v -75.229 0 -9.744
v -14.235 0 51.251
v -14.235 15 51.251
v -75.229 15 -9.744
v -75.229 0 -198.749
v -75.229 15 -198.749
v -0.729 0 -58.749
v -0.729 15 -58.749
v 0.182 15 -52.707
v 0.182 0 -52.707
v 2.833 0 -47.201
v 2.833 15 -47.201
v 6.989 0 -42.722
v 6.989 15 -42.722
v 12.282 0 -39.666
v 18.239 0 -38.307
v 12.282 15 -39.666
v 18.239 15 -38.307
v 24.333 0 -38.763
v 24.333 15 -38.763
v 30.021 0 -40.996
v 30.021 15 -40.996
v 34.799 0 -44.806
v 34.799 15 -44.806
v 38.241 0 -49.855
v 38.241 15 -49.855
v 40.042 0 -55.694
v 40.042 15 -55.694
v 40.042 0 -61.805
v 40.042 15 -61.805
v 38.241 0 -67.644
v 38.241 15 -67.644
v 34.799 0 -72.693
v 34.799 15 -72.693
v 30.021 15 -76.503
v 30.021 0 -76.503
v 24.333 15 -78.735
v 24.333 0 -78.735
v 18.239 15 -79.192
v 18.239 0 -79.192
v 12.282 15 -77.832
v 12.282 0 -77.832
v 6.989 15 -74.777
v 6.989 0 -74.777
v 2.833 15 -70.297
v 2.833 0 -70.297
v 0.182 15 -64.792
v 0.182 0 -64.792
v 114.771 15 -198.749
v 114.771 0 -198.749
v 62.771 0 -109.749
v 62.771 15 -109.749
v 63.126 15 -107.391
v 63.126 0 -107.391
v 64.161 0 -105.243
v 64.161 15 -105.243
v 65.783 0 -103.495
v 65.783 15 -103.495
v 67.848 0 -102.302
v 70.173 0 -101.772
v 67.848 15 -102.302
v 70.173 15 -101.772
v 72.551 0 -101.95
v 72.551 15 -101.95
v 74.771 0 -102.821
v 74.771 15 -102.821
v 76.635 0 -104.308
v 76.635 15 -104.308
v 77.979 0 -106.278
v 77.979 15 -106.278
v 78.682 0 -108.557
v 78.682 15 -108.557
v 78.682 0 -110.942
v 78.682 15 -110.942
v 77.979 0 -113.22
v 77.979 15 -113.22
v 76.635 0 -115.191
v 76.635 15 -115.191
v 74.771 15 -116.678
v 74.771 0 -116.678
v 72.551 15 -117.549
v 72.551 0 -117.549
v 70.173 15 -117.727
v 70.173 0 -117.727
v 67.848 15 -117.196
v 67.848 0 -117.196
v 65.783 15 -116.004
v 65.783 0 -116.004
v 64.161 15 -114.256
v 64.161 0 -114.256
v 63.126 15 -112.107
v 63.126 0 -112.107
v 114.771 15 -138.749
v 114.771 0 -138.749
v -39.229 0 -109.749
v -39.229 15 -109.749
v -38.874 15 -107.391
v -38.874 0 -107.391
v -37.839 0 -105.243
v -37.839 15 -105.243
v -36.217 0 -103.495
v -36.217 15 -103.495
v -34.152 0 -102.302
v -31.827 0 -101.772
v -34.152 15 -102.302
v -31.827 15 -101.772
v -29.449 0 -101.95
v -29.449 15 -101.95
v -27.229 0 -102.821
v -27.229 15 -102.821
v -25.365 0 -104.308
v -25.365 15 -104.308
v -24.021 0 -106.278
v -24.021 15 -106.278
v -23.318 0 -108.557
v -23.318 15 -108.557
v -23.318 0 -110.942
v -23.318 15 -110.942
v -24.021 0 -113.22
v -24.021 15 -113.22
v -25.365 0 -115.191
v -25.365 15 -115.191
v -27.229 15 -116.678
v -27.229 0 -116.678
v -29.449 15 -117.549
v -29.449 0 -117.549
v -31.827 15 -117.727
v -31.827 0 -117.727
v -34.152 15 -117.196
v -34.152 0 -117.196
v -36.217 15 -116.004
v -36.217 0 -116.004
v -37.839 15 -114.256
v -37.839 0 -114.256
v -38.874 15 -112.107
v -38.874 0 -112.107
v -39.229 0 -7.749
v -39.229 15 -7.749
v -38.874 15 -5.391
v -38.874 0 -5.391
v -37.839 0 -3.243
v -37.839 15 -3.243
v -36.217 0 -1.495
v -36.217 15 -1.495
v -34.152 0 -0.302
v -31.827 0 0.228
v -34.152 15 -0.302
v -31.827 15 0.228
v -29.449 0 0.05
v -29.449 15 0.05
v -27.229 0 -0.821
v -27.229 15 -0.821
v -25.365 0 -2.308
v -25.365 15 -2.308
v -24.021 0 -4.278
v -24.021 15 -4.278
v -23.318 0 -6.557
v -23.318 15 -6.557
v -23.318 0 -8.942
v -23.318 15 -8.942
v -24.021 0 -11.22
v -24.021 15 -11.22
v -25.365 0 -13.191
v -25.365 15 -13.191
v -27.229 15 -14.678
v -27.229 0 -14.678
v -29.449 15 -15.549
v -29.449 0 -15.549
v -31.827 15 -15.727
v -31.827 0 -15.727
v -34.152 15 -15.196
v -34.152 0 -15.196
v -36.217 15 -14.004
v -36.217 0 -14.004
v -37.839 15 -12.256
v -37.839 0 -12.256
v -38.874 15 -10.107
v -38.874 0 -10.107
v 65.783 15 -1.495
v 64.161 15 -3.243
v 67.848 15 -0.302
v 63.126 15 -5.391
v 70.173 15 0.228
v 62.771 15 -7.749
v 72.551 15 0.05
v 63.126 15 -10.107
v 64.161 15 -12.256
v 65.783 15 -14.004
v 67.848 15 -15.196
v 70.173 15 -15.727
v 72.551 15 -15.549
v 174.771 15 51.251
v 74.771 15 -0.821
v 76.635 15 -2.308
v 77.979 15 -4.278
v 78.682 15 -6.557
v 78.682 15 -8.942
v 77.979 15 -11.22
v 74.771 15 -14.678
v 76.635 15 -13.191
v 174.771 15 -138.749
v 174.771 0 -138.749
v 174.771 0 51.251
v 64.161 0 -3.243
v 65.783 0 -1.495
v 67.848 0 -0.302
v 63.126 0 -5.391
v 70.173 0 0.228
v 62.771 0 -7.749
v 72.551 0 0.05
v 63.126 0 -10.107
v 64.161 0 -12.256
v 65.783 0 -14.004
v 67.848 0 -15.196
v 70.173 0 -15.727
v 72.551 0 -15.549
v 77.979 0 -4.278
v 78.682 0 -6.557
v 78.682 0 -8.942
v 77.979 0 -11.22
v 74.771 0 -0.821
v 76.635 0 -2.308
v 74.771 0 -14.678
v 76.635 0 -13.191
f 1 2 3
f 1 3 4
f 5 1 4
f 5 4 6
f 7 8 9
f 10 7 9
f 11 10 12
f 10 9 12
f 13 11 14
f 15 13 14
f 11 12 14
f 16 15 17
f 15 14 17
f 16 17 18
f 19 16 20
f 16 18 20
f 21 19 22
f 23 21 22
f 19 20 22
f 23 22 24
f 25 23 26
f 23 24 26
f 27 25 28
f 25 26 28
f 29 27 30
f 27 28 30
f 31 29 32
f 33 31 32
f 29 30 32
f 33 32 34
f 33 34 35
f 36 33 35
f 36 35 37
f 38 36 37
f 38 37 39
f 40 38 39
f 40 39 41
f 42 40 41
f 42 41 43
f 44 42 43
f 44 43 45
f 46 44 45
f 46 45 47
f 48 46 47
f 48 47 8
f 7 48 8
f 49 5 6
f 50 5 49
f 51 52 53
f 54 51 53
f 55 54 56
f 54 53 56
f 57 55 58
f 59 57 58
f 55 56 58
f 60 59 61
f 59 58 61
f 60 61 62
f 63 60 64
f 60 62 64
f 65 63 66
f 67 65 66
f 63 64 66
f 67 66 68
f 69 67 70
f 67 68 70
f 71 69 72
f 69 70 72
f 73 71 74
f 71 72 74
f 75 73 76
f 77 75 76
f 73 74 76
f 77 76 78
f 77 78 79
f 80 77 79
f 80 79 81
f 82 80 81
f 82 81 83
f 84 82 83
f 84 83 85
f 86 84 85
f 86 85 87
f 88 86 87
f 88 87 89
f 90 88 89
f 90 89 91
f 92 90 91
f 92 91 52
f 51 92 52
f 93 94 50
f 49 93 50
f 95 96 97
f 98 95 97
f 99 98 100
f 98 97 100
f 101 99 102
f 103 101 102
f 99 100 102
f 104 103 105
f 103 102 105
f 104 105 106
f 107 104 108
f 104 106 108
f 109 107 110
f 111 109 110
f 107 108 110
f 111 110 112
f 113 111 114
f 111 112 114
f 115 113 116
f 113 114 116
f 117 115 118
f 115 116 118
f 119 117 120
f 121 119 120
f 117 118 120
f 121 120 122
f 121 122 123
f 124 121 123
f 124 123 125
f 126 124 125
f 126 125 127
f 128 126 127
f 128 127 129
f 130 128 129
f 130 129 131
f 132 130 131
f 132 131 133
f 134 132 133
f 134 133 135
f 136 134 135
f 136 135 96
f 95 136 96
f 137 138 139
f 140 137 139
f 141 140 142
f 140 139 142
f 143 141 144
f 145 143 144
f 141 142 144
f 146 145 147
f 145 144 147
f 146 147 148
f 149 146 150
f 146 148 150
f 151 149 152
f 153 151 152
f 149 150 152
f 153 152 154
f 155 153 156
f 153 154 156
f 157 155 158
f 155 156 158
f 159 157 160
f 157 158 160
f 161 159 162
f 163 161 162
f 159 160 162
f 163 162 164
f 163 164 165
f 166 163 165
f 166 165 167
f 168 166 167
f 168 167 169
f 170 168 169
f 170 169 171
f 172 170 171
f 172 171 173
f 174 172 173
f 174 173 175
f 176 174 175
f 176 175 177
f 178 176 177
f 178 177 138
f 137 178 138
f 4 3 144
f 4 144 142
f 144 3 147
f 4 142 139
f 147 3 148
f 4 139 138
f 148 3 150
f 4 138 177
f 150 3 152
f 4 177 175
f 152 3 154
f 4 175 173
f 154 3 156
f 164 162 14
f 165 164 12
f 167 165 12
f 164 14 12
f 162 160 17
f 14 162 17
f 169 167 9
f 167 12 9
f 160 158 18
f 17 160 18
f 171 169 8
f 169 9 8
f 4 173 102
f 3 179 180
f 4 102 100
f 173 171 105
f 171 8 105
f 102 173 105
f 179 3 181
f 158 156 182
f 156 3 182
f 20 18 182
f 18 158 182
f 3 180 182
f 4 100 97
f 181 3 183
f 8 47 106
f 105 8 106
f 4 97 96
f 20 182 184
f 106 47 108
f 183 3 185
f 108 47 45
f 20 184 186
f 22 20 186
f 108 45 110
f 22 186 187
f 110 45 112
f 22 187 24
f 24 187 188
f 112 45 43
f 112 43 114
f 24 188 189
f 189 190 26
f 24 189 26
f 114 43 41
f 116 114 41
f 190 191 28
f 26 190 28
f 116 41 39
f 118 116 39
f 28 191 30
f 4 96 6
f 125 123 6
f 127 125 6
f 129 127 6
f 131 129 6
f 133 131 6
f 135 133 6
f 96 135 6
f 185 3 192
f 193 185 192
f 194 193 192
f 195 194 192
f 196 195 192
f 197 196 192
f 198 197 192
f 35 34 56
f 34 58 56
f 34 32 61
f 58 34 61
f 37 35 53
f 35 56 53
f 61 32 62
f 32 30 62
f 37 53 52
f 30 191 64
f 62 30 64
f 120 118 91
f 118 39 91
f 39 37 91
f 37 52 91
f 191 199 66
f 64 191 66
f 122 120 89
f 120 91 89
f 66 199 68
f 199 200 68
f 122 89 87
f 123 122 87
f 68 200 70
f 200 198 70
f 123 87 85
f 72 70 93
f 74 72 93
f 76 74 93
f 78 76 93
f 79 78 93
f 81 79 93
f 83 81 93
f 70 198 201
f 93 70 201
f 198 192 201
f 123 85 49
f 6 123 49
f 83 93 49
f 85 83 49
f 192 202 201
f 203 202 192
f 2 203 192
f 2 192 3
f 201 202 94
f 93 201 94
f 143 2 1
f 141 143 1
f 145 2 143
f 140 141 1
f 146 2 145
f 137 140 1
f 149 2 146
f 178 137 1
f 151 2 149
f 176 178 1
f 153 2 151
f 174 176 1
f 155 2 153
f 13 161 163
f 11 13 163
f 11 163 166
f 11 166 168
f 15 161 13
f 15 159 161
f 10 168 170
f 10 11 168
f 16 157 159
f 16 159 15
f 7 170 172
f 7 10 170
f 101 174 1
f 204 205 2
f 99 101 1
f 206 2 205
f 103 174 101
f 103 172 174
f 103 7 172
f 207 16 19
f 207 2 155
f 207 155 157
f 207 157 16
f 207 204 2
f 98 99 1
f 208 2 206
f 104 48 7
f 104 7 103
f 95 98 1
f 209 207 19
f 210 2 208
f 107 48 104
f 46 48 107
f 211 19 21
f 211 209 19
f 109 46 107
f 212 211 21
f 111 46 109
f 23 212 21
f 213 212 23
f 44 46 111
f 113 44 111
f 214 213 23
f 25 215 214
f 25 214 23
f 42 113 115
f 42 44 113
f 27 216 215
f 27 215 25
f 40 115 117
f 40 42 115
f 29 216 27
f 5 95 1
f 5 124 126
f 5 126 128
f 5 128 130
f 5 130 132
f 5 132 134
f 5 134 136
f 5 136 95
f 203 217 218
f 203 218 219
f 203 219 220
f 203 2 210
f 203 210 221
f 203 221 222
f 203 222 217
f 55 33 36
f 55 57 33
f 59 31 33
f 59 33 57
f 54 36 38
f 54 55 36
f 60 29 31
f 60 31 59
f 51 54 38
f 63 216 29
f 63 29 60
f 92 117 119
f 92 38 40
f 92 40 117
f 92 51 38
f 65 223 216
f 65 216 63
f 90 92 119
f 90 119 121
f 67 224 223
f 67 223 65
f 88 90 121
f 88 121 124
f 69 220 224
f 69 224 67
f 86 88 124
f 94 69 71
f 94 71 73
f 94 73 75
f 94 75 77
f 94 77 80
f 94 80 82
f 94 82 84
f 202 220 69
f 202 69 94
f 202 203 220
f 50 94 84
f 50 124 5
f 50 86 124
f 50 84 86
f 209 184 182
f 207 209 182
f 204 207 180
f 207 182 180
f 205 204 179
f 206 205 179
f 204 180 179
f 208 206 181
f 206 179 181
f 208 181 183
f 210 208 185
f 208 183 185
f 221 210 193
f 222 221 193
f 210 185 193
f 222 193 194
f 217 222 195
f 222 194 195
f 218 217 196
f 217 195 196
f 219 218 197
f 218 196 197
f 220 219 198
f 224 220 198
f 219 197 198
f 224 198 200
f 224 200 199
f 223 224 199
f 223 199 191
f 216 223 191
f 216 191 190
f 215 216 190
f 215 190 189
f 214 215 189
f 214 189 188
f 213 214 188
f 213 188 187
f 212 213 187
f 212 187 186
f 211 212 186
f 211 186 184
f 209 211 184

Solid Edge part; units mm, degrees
sketch "Sketch1" plane through (0, 0, 0) normal (0, -1, 0) x (1, 0, 0)
  line L0 (-75.229, -198.7494) -> (174.771, -198.7494)
  line L1 (174.771, -198.7494) -> (174.771, 51.2506)
  line L2 (174.771, 51.2506) -> (-75.229, 51.2506)
  line L3 (-75.229, 51.2506) -> (-75.229, -198.7494)
  dimension "D1" = 250
  dimension "D2" = 250
extrude "Protrusion1" add sketch "Sketch1" against normal blind 15
sketch "Sketch2" plane through (-15.229, 15, 1.2506) normal (0, 1, 0) x (-1, 0, 0)
  circle A0 centre (16, -111) radius 8
  circle A1 centre (16, -9) radius 8
  circle A2 centre (-86, -111) radius 8
  circle A3 centre (-35, -60) radius 20.5
  circle A4 centre (-86, -9) radius 8
  dimension "D1" = 16
  dimension "D2" = 16
  dimension "D3" = 16
  dimension "D4" = 16
  dimension "D5" = 102
  dimension "D6" = 102
  dimension "D7" = 41
  dimension "D8" = 51
  dimension "D9" = 51
  dimension "D10" = 30
  dimension "D11" = 15
extrude "Cutout1" cut sketch "Sketch2" against normal through all
sketch "Sketch3" plane through (49.771, 0, -73.7494) normal (0, -1, 0) x (-1, 0, 0)
  line L0 (64.0056, -125) -> (125, -64.0056)
  line L1 (125, -64.0056) -> (125, -125)
  line L2 (125, -125) -> (64.0056, -125)
  line L3 (-125, 65) -> (-65, 65)
  line L4 (-65, 65) -> (-65, 125)
  line L5 (-65, 125) -> (-125, 125)
  line L6 (-125, 125) -> (-125, 65)
  dimension "D1" = 60
  dimension "D2" = 60
extrude "Cutout2" cut sketch "Sketch3" against normal through all
properties material "Aluminum, 6061-T6"
